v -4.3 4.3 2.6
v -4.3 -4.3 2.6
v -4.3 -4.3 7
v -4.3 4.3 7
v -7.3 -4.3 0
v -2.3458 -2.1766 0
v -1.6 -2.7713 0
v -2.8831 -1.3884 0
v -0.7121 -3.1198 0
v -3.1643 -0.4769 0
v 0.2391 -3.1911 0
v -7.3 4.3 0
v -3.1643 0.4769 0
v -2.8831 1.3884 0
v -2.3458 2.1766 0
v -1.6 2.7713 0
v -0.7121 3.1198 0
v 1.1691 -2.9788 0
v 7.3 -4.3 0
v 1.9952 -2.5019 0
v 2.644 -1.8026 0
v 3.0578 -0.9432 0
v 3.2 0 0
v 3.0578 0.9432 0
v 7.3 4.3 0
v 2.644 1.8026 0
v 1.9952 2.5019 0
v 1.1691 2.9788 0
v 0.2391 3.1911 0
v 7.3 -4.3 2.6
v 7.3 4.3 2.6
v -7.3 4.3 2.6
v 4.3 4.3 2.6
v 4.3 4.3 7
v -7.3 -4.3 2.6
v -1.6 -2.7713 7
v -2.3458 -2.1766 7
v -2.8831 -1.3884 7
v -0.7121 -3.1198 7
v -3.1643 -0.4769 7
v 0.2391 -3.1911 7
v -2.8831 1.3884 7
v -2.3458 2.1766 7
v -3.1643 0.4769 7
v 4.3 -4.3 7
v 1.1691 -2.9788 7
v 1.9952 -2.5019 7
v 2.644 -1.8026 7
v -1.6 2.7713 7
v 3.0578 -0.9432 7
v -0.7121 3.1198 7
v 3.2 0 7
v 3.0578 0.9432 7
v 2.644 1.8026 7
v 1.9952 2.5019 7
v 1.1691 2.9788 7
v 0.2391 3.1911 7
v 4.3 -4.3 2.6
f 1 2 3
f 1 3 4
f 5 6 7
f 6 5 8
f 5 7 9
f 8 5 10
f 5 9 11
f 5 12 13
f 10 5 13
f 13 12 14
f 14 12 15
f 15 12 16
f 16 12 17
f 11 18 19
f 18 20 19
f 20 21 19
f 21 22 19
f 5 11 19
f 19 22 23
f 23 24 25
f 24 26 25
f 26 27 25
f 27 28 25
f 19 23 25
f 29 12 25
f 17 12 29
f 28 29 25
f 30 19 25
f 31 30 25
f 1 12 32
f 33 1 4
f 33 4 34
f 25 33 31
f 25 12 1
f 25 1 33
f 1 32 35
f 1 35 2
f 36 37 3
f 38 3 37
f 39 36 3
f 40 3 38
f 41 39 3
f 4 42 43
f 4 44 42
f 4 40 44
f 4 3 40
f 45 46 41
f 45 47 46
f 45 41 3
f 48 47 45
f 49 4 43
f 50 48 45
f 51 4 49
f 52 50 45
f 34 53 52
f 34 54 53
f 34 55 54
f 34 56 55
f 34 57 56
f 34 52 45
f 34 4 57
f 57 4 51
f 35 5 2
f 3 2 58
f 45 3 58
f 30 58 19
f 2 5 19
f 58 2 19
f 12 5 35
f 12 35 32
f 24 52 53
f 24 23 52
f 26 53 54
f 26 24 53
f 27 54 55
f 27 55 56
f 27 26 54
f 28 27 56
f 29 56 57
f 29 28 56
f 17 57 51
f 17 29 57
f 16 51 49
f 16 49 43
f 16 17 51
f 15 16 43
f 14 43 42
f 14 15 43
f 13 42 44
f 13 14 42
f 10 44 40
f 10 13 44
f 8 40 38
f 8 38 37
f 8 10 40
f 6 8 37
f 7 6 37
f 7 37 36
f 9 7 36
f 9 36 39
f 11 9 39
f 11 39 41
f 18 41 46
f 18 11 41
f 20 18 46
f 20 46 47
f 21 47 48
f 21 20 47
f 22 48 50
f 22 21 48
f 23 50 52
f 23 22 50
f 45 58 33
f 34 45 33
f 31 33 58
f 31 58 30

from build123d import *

# Parameters (mm, degrees)
SKETCH_W     = 14.6
SKETCH_H     = 8.6
SKETCH_R     = 3.2
PAD_DEPTH    = 2.6
SKETCH001_W  = 8.6
SKETCH001_H  = 8.6
SKETCH001_R  = 3.2
PAD001_DEPTH = 4.4


with BuildPart() as part:
    # Sketch → Pad (new body)
    with BuildSketch(Plane.XY):
        Rectangle(SKETCH_W, SKETCH_H)
        Circle(SKETCH_R, mode=Mode.SUBTRACT)
    extrude(amount=PAD_DEPTH)

    # Sketch001 (on Face7 of Pad) → Pad001 (join)
    with BuildSketch(Plane.XY.offset(2.6)):
        Rectangle(SKETCH001_W, SKETCH001_H)
        Circle(SKETCH001_R, mode=Mode.SUBTRACT)
    extrude(amount=PAD001_DEPTH)


solid = part.part
